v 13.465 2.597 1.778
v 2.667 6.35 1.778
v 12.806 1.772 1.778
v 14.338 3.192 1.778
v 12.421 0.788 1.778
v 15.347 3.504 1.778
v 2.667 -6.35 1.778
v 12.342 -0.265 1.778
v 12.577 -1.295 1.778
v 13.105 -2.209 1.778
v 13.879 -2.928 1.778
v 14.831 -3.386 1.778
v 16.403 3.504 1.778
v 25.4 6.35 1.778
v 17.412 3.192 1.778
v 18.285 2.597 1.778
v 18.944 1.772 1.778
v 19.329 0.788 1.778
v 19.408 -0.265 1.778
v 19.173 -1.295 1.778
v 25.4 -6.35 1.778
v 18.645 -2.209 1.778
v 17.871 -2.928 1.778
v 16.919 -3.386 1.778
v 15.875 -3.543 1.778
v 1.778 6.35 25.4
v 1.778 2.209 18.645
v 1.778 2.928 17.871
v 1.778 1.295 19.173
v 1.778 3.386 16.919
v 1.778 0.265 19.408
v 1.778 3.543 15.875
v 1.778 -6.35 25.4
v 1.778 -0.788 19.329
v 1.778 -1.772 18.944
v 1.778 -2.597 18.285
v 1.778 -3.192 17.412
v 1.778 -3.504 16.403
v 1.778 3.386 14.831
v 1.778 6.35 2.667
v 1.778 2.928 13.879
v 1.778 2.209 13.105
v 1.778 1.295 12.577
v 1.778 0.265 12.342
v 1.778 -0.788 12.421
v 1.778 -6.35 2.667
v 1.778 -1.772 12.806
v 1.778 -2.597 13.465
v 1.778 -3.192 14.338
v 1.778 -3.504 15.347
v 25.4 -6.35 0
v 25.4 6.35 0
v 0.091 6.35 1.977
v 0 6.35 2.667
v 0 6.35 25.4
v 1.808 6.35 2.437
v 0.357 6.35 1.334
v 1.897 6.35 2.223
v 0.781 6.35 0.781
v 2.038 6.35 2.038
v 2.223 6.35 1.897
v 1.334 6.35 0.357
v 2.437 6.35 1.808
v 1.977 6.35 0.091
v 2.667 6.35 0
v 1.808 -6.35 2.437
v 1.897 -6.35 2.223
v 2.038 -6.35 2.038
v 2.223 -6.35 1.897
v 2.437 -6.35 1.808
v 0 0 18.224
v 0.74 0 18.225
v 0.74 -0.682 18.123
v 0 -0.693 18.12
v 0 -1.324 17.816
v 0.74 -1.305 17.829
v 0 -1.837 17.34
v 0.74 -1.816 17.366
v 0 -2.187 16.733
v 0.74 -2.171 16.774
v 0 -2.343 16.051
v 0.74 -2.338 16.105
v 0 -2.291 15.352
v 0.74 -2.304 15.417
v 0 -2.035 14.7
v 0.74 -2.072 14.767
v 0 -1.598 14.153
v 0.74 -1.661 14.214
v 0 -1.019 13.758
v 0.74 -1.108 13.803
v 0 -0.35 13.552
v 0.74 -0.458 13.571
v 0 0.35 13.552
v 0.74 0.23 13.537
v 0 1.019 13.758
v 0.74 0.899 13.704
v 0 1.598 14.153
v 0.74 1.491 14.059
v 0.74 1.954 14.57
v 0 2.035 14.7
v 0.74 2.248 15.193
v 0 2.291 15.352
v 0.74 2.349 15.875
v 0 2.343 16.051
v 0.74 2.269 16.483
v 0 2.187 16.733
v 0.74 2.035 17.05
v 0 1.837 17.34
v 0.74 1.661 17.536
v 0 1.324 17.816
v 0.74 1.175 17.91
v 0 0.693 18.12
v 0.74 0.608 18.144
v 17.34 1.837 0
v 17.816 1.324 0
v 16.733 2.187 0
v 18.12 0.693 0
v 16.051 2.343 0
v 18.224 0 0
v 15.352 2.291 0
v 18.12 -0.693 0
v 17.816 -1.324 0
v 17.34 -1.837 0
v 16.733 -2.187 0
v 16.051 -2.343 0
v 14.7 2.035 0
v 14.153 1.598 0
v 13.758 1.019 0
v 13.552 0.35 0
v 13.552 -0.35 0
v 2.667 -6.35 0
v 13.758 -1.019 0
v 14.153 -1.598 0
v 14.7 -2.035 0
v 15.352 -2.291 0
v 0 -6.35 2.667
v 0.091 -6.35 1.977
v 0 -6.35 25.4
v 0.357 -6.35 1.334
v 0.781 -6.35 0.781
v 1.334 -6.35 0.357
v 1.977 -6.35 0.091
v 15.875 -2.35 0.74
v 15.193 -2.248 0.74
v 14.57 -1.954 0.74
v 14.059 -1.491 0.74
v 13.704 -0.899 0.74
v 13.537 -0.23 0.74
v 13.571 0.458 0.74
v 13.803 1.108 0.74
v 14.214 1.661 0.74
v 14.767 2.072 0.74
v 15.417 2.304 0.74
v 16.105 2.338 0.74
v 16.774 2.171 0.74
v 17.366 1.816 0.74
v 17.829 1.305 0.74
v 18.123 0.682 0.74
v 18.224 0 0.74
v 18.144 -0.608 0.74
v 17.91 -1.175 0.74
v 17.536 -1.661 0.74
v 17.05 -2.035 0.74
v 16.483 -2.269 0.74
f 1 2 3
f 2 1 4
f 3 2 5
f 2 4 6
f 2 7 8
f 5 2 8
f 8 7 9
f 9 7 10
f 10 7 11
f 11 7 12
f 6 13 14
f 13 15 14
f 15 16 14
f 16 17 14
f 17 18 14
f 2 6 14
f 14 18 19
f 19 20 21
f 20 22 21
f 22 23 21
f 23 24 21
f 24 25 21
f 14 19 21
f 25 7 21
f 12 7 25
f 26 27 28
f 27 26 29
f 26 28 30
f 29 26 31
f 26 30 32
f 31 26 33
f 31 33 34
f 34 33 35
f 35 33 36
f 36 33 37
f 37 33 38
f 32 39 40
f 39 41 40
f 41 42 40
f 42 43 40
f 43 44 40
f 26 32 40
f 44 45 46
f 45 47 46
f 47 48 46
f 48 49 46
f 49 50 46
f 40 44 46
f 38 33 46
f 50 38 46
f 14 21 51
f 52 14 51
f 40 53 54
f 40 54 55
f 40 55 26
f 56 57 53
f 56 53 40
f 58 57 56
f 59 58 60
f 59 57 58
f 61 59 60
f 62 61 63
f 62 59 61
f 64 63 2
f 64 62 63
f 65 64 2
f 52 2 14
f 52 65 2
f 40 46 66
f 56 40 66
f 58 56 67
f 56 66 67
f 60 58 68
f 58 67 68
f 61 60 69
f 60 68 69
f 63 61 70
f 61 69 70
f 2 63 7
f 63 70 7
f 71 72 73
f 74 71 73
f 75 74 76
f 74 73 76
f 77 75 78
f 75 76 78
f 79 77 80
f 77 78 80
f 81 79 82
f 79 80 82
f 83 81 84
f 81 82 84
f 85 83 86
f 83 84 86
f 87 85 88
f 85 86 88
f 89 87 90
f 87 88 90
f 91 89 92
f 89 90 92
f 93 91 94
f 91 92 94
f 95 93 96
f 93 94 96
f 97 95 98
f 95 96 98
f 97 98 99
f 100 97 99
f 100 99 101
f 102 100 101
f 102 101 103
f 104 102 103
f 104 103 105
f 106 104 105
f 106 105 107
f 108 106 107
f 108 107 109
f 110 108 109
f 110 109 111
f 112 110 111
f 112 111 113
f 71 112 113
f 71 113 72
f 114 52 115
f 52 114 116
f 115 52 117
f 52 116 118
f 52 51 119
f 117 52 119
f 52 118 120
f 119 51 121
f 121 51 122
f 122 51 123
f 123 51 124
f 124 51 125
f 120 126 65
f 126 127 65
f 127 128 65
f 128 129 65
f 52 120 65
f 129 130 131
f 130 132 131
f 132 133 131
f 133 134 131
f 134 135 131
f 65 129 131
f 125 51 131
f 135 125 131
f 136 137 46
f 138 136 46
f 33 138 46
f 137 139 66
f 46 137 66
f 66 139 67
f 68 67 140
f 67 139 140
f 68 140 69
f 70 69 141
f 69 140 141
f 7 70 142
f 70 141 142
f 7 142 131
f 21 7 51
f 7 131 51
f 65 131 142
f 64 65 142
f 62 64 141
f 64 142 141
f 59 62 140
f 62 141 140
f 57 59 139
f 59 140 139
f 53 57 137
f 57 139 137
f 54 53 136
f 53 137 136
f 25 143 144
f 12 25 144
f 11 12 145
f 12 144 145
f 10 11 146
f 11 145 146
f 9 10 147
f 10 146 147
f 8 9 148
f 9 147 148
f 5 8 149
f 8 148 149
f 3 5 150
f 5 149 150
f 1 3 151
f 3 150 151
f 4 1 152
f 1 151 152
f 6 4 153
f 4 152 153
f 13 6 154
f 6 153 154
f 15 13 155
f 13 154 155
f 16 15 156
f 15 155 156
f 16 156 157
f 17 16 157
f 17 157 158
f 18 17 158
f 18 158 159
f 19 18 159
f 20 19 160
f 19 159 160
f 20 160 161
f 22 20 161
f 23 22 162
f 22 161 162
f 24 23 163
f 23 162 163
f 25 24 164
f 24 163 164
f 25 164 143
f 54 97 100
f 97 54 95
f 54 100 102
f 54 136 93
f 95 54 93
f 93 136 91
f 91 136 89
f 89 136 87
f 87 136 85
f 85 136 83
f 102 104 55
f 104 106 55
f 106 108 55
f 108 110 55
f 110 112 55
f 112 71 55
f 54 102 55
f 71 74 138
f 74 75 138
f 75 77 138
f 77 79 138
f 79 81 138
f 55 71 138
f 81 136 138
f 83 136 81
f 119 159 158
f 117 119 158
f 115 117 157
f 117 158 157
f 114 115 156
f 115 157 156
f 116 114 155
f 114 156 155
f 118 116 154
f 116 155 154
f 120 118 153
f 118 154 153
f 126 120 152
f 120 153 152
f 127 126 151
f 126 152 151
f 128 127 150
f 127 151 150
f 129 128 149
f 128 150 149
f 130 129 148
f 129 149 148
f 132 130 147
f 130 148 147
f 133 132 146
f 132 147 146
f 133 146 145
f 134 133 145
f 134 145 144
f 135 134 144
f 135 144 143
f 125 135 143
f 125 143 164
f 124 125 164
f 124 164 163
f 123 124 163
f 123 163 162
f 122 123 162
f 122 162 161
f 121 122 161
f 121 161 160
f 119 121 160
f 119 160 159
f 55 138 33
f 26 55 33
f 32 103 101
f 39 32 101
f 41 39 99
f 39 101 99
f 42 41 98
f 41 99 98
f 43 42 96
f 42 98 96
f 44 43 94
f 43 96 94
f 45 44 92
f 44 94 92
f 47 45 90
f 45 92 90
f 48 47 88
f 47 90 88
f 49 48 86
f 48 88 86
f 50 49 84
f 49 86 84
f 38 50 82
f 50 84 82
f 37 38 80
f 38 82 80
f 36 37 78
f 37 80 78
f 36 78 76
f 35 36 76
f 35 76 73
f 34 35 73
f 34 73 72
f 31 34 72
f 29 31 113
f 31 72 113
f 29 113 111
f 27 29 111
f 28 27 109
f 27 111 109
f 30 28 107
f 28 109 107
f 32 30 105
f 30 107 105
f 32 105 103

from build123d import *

# Parameters (mm, degrees)
EXTRUDE_THIN1_START = -6.35
EXTRUDE_THIN1_DEPTH = 12.7
SKETCH4_R           = 2.3495
EXTRUDE3_DEPTH      = 33.79453796
CIRPATTERN1_COUNT   = 2


# Read off the part's stored shape, not the designer's step: Extrude-Thin1
with BuildPart() as part:
    # Extrude-Thin1 outline → Extrude-Thin1 (new body)
    with BuildSketch(Plane(origin=(0, 0, 0), x_dir=(1, 0, 0), z_dir=(0, 1, 0)).offset(EXTRUDE_THIN1_START)):
        with BuildLine():
            Line((2.667, -1.778), (25.4, -1.778))
            Line((25.4, -1.778), (25.4, 0))
            Line((25.4, 0), (2.667, 0))
            ThreePointArc((2.667, 0), (0.781146215, -0.781146215), (0, -2.667))
            Line((0, -2.667), (0, -25.4))
            Line((0, -25.4), (1.778, -25.4))
            Line((1.778, -25.4), (1.778, -2.667))
            ThreePointArc((1.778, -2.667), (2.038382072, -2.038382072), (2.667, -1.778))
        make_face()
    extrude(amount=EXTRUDE_THIN1_DEPTH)

    # Sketch4 → Extrude3 (cut, through all)
    with BuildSketch(Plane(origin=(3.556, 0, 1.778), x_dir=(1, 0, 0), z_dir=(0, 0, 1))):
        with Locations((12.319, 0)):
            Circle(SKETCH4_R)
        with Locations((-13.081, 0)):
            Circle(SKETCH4_R)
        with Locations((-38.481, 0)):
            Circle(SKETCH4_R)
        with Locations((-63.881, 0)):
            Circle(SKETCH4_R)
    extrude3 = extrude(amount=-EXTRUDE3_DEPTH, mode=Mode.SUBTRACT)

    # Cut-Extrude1 cone 1 section (through the dimple's axis) → Cut-Extrude1 (revolve, cut)
    with BuildSketch(Plane(origin=(15.875, 0, 1.778), x_dir=(0, -1, 0), z_dir=(1, 0, 0))):
        Polygon((0, 0), (3.5433, 0), (0, 3.080143698), align=None)
    cut_extrude1 = revolve(axis=Axis((15.875, 0, 1.778), (0, 0, -1)), mode=Mode.SUBTRACT)

    # CirPattern1: Extrude3, Cut-Extrude1 ×2 about axis
    cirpattern1_axis = Axis((0, 0, 0), (0.7071067811865464, 0, 0.7071067811865487))
    add([extrude3.rotate(cirpattern1_axis, i * 360 / CIRPATTERN1_COUNT) for i in range(1, CIRPATTERN1_COUNT)], mode=Mode.SUBTRACT)
    add([cut_extrude1.rotate(cirpattern1_axis, i * 360 / CIRPATTERN1_COUNT) for i in range(1, CIRPATTERN1_COUNT)], mode=Mode.SUBTRACT)


solid = part.part
